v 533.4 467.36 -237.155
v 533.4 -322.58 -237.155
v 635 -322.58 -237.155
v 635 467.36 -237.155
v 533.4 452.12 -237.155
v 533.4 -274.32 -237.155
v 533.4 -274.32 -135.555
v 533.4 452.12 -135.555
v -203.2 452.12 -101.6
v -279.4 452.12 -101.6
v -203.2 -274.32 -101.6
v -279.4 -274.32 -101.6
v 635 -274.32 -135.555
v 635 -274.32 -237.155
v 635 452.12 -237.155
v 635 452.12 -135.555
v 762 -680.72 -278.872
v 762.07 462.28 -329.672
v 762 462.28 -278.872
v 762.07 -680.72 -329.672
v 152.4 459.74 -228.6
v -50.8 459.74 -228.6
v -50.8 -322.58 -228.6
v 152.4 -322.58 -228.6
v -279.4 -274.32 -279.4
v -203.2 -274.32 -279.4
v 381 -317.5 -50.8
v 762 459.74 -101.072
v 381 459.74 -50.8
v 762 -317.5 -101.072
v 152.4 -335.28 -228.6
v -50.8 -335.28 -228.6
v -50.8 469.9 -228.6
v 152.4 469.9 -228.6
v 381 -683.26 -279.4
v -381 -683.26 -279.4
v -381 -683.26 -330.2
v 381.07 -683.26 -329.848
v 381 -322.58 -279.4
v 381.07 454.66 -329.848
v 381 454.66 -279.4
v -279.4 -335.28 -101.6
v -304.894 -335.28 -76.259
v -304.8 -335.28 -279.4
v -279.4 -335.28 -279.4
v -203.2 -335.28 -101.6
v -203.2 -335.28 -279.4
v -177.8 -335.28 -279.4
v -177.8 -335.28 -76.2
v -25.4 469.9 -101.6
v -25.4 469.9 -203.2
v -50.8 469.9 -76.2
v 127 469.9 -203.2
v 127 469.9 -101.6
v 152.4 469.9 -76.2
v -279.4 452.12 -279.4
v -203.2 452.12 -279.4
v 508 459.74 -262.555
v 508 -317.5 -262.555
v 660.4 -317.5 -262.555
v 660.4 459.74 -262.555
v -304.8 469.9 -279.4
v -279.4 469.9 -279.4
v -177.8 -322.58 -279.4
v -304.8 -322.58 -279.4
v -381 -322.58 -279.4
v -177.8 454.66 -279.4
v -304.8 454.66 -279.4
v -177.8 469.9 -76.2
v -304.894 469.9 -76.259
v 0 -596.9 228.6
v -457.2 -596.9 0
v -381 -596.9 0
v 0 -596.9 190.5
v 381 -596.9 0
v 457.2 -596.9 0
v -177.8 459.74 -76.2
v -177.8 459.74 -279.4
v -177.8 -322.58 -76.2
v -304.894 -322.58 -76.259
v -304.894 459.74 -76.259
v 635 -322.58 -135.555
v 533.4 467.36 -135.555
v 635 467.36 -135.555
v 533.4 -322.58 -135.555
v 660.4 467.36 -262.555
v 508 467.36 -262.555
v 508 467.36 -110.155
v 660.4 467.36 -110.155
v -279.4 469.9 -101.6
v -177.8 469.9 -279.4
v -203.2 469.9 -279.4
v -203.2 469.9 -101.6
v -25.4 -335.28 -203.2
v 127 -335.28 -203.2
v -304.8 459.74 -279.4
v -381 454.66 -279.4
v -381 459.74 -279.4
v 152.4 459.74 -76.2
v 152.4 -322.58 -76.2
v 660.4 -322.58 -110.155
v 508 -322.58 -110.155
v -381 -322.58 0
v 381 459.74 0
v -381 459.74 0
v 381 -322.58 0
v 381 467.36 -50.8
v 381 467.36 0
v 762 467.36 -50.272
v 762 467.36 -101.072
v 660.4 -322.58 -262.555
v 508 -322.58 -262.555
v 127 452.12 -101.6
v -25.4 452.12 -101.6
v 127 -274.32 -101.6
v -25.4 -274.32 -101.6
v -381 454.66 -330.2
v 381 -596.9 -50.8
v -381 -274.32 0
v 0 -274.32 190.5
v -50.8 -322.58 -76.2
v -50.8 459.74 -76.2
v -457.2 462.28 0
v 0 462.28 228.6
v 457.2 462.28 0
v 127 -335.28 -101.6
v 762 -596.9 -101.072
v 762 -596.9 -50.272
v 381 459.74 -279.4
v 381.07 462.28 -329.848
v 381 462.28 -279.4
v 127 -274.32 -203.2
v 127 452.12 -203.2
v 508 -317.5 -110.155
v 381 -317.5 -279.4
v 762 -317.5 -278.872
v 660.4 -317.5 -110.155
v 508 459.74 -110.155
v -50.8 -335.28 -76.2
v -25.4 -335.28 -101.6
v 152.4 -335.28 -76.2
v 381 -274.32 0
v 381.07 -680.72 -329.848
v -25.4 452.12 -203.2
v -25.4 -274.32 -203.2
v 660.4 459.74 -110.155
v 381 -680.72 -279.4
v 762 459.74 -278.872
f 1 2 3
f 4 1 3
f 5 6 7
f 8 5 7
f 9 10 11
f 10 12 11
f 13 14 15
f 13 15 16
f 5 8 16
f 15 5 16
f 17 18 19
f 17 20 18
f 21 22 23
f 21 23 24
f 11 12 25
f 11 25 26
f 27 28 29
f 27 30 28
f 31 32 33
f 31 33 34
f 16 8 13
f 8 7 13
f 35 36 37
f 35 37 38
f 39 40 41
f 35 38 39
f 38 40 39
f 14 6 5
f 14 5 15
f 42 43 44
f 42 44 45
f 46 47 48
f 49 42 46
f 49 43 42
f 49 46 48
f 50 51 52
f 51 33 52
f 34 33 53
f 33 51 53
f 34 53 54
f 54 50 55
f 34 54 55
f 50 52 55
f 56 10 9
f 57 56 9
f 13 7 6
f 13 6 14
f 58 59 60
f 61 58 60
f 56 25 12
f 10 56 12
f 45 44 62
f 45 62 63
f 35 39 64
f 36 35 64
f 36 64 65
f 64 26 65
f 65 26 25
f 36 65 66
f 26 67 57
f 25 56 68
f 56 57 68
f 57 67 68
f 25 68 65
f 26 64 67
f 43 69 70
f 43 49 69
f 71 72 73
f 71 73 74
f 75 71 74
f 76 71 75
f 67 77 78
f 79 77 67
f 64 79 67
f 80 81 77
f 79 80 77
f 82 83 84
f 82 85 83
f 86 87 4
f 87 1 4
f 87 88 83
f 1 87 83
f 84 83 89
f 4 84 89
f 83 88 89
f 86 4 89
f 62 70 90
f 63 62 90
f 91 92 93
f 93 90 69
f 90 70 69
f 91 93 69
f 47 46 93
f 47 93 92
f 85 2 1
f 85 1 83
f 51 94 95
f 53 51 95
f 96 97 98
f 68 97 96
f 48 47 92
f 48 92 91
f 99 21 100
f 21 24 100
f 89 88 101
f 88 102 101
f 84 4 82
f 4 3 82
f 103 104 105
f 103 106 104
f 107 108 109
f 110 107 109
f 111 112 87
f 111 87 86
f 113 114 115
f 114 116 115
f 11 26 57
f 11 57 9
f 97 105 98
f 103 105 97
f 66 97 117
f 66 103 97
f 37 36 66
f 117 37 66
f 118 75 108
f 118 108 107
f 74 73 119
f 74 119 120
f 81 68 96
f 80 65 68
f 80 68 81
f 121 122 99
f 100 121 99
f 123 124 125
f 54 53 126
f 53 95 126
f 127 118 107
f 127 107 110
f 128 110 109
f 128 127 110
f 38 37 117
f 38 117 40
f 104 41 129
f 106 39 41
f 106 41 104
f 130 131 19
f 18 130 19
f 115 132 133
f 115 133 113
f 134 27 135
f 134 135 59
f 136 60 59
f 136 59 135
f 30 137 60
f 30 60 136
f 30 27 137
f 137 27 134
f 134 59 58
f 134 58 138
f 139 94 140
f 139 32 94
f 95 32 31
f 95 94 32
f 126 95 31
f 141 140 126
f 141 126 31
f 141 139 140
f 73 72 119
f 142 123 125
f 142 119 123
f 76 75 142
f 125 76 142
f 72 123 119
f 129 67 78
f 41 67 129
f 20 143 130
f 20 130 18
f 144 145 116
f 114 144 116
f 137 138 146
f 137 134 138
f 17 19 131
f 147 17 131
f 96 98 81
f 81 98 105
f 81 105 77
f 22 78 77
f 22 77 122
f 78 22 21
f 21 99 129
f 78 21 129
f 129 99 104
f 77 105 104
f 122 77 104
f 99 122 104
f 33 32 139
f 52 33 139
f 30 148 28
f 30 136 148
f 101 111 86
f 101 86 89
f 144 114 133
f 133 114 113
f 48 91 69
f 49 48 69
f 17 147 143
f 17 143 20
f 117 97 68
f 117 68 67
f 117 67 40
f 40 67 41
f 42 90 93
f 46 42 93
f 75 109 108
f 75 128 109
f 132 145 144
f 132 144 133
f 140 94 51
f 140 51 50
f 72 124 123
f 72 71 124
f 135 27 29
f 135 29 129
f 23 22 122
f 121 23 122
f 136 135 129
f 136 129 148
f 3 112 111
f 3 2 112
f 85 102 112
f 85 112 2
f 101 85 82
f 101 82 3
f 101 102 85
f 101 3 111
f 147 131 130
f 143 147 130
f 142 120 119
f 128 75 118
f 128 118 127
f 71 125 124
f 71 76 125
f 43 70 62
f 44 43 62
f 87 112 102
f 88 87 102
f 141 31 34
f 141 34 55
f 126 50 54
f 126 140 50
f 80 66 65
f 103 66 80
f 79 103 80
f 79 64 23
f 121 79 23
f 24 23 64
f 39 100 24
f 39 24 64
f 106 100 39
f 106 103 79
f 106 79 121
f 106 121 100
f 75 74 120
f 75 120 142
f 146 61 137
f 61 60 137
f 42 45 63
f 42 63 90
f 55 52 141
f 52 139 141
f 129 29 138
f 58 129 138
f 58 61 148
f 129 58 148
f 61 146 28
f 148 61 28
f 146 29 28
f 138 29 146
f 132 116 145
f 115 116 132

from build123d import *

# Parameters (mm, degrees)
F1_DEPTH       = 596.9
F1_DEPTH_BACK  = 462.28
F2_DEPTH       = 274.32
F2_DEPTH_BACK  = 462.28
F3_DEPTH       = 596.9
F3_DEPTH_BACK  = 467.36
F0_W           = 203.2
F0_H           = 152.4
F4_DEPTH       = 322.58
F4_DEPTH_BACK  = 459.74
F5_DEPTH       = 683.26
F5_DEPTH_BACK  = 454.66
F0_W_2         = 76.2
F0_H_2         = 177.8
F0_W_3         = 152.4
F0_H_3         = 101.6
F0_W_4         = 101.6
F6_DEPTH       = 274.32
F6_DEPTH_BACK  = 452.12
F7_DEPTH       = 335.28
F7_DEPTH_BACK  = 469.9
F8_DEPTH       = 317.5
F8_DEPTH_BACK  = 459.74
F9_DEPTH       = 322.58
F9_DEPTH_BACK  = 467.36
F10_DEPTH      = 680.72
F10_DEPTH_BACK = 462.28


with BuildPart() as f1:
    # F0 (on Front) → F1 (new body, two sides)
    with BuildSketch(Plane.XZ) as f1_sk:
        Polygon((-457.2, 0), (-381, 0), (0, 190.5), (0, 228.6), align=None)
        Polygon((0, 190.5), (381, 0), (457.2, 0), (0, 228.6), align=None)
    extrude(amount=F1_DEPTH)
    extrude(f1_sk.sketch, amount=-F1_DEPTH_BACK)

    # F0 (on Front) → F2 (join, two sides)
    with BuildSketch(Plane.XZ) as f2_sk:
        Polygon((-381, 0), (0, 0), (0, 190.5), align=None)
        Polygon((0, 190.5), (0, 0), (381, 0), align=None)
    extrude(amount=F2_DEPTH)
    extrude(f2_sk.sketch, amount=-F2_DEPTH_BACK)


with BuildPart() as f3:
    # F0 (on Front) → F3 (new body, two sides)
    with BuildSketch(Plane.XZ) as f3_sk:
        Polygon((761.999635, -50.272315), (381, 0), (381, -50.8), (761.999635, -101.072315), align=None)
    extrude(amount=F3_DEPTH)
    extrude(f3_sk.sketch, amount=-F3_DEPTH_BACK)


with BuildPart() as f4:
    # F0 (on Front) → F4 (new body, two sides)
    with BuildSketch(Plane.XZ) as f4_sk:
        Polygon((381, 0), (0, 0), (-381, 0), (-381, -279.4), (-304.8, -279.4), (-304.893786, -76.258677), (-177.8, -76.2), (-177.8, -279.4), (381, -279.4), (381, -50.8), align=None)
        with Locations((50.8, -152.4)):
            Rectangle(F0_W, F0_H, mode=Mode.SUBTRACT)
    extrude(amount=F4_DEPTH)
    extrude(f4_sk.sketch, amount=-F4_DEPTH_BACK)

    # F0 (on Front) → F5 (join, two sides)
    with BuildSketch(Plane.XZ) as f5_sk:
        Polygon((-304.8, -279.4), (-381, -279.4), (-381, -330.2), (381.069871, -329.848167), (381, -279.4), (-177.8, -279.4), (-203.2, -279.4), (-279.4, -279.4), align=None)
    extrude(amount=F5_DEPTH)
    extrude(f5_sk.sketch, amount=-F5_DEPTH_BACK)

    # F0 (on Front) → F6 (join, two sides)
    with BuildSketch(Plane.XZ) as f6_sk:
        with Locations((-241.3, -190.5)):
            Rectangle(F0_W_2, F0_H_2)
        with Locations((50.8, -152.4)):
            Rectangle(F0_W_3, F0_H_3)
        with Locations((584.199635, -186.355176)):
            Rectangle(F0_W_4, F0_H_3)
    extrude(amount=F6_DEPTH)
    extrude(f6_sk.sketch, amount=-F6_DEPTH_BACK)


with BuildPart() as f7:
    # F0 (on Front) → F7 (new body, two sides)
    with BuildSketch(Plane.XZ) as f7_sk:
        Polygon((-304.893786, -76.258677), (-304.8, -279.4), (-279.4, -279.4), (-279.4, -101.6), (-203.2, -101.6), (-203.2, -279.4), (-177.8, -279.4), (-177.8, -76.2), align=None)
        with Locations((50.8, -152.4)):
            Rectangle(F0_W, F0_H)
        with Locations((50.8, -152.4)):
            Rectangle(F0_W_3, F0_H_3, mode=Mode.SUBTRACT)
    extrude(amount=F7_DEPTH)
    extrude(f7_sk.sketch, amount=-F7_DEPTH_BACK)


with BuildPart() as f8:
    # F0 (on Front) → F8 (new body, two sides)
    with BuildSketch(Plane.XZ) as f8_sk:
        Polygon((761.999635, -101.072315), (381, -50.8), (381, -279.4), (761.999635, -278.872315), align=None)
        with Locations((584.199635, -186.355176)):
            Rectangle(F0_W_3, F0_H, mode=Mode.SUBTRACT)
    extrude(amount=F8_DEPTH)
    extrude(f8_sk.sketch, amount=-F8_DEPTH_BACK)


with BuildPart() as f9:
    # F0 (on Front) → F9 (new body, two sides)
    with BuildSketch(Plane.XZ) as f9_sk:
        with Locations((584.199635, -186.355176)):
            Rectangle(F0_W_3, F0_H)
        with Locations((584.199635, -186.355176)):
            Rectangle(F0_W_4, F0_H_3, mode=Mode.SUBTRACT)
    extrude(amount=F9_DEPTH)
    extrude(f9_sk.sketch, amount=-F9_DEPTH_BACK)


with BuildPart() as f10:
    # F0 (on Front) → F10 (new body, two sides)
    with BuildSketch(Plane.XZ) as f10_sk:
        Polygon((761.999635, -278.872315), (381, -279.4), (381.069871, -329.848167), (762.069993, -329.672266), align=None)
    extrude(amount=F10_DEPTH)
    extrude(f10_sk.sketch, amount=-F10_DEPTH_BACK)


solid = Compound([f1.part, f3.part, f4.part, f7.part, f8.part, f9.part, f10.part])
